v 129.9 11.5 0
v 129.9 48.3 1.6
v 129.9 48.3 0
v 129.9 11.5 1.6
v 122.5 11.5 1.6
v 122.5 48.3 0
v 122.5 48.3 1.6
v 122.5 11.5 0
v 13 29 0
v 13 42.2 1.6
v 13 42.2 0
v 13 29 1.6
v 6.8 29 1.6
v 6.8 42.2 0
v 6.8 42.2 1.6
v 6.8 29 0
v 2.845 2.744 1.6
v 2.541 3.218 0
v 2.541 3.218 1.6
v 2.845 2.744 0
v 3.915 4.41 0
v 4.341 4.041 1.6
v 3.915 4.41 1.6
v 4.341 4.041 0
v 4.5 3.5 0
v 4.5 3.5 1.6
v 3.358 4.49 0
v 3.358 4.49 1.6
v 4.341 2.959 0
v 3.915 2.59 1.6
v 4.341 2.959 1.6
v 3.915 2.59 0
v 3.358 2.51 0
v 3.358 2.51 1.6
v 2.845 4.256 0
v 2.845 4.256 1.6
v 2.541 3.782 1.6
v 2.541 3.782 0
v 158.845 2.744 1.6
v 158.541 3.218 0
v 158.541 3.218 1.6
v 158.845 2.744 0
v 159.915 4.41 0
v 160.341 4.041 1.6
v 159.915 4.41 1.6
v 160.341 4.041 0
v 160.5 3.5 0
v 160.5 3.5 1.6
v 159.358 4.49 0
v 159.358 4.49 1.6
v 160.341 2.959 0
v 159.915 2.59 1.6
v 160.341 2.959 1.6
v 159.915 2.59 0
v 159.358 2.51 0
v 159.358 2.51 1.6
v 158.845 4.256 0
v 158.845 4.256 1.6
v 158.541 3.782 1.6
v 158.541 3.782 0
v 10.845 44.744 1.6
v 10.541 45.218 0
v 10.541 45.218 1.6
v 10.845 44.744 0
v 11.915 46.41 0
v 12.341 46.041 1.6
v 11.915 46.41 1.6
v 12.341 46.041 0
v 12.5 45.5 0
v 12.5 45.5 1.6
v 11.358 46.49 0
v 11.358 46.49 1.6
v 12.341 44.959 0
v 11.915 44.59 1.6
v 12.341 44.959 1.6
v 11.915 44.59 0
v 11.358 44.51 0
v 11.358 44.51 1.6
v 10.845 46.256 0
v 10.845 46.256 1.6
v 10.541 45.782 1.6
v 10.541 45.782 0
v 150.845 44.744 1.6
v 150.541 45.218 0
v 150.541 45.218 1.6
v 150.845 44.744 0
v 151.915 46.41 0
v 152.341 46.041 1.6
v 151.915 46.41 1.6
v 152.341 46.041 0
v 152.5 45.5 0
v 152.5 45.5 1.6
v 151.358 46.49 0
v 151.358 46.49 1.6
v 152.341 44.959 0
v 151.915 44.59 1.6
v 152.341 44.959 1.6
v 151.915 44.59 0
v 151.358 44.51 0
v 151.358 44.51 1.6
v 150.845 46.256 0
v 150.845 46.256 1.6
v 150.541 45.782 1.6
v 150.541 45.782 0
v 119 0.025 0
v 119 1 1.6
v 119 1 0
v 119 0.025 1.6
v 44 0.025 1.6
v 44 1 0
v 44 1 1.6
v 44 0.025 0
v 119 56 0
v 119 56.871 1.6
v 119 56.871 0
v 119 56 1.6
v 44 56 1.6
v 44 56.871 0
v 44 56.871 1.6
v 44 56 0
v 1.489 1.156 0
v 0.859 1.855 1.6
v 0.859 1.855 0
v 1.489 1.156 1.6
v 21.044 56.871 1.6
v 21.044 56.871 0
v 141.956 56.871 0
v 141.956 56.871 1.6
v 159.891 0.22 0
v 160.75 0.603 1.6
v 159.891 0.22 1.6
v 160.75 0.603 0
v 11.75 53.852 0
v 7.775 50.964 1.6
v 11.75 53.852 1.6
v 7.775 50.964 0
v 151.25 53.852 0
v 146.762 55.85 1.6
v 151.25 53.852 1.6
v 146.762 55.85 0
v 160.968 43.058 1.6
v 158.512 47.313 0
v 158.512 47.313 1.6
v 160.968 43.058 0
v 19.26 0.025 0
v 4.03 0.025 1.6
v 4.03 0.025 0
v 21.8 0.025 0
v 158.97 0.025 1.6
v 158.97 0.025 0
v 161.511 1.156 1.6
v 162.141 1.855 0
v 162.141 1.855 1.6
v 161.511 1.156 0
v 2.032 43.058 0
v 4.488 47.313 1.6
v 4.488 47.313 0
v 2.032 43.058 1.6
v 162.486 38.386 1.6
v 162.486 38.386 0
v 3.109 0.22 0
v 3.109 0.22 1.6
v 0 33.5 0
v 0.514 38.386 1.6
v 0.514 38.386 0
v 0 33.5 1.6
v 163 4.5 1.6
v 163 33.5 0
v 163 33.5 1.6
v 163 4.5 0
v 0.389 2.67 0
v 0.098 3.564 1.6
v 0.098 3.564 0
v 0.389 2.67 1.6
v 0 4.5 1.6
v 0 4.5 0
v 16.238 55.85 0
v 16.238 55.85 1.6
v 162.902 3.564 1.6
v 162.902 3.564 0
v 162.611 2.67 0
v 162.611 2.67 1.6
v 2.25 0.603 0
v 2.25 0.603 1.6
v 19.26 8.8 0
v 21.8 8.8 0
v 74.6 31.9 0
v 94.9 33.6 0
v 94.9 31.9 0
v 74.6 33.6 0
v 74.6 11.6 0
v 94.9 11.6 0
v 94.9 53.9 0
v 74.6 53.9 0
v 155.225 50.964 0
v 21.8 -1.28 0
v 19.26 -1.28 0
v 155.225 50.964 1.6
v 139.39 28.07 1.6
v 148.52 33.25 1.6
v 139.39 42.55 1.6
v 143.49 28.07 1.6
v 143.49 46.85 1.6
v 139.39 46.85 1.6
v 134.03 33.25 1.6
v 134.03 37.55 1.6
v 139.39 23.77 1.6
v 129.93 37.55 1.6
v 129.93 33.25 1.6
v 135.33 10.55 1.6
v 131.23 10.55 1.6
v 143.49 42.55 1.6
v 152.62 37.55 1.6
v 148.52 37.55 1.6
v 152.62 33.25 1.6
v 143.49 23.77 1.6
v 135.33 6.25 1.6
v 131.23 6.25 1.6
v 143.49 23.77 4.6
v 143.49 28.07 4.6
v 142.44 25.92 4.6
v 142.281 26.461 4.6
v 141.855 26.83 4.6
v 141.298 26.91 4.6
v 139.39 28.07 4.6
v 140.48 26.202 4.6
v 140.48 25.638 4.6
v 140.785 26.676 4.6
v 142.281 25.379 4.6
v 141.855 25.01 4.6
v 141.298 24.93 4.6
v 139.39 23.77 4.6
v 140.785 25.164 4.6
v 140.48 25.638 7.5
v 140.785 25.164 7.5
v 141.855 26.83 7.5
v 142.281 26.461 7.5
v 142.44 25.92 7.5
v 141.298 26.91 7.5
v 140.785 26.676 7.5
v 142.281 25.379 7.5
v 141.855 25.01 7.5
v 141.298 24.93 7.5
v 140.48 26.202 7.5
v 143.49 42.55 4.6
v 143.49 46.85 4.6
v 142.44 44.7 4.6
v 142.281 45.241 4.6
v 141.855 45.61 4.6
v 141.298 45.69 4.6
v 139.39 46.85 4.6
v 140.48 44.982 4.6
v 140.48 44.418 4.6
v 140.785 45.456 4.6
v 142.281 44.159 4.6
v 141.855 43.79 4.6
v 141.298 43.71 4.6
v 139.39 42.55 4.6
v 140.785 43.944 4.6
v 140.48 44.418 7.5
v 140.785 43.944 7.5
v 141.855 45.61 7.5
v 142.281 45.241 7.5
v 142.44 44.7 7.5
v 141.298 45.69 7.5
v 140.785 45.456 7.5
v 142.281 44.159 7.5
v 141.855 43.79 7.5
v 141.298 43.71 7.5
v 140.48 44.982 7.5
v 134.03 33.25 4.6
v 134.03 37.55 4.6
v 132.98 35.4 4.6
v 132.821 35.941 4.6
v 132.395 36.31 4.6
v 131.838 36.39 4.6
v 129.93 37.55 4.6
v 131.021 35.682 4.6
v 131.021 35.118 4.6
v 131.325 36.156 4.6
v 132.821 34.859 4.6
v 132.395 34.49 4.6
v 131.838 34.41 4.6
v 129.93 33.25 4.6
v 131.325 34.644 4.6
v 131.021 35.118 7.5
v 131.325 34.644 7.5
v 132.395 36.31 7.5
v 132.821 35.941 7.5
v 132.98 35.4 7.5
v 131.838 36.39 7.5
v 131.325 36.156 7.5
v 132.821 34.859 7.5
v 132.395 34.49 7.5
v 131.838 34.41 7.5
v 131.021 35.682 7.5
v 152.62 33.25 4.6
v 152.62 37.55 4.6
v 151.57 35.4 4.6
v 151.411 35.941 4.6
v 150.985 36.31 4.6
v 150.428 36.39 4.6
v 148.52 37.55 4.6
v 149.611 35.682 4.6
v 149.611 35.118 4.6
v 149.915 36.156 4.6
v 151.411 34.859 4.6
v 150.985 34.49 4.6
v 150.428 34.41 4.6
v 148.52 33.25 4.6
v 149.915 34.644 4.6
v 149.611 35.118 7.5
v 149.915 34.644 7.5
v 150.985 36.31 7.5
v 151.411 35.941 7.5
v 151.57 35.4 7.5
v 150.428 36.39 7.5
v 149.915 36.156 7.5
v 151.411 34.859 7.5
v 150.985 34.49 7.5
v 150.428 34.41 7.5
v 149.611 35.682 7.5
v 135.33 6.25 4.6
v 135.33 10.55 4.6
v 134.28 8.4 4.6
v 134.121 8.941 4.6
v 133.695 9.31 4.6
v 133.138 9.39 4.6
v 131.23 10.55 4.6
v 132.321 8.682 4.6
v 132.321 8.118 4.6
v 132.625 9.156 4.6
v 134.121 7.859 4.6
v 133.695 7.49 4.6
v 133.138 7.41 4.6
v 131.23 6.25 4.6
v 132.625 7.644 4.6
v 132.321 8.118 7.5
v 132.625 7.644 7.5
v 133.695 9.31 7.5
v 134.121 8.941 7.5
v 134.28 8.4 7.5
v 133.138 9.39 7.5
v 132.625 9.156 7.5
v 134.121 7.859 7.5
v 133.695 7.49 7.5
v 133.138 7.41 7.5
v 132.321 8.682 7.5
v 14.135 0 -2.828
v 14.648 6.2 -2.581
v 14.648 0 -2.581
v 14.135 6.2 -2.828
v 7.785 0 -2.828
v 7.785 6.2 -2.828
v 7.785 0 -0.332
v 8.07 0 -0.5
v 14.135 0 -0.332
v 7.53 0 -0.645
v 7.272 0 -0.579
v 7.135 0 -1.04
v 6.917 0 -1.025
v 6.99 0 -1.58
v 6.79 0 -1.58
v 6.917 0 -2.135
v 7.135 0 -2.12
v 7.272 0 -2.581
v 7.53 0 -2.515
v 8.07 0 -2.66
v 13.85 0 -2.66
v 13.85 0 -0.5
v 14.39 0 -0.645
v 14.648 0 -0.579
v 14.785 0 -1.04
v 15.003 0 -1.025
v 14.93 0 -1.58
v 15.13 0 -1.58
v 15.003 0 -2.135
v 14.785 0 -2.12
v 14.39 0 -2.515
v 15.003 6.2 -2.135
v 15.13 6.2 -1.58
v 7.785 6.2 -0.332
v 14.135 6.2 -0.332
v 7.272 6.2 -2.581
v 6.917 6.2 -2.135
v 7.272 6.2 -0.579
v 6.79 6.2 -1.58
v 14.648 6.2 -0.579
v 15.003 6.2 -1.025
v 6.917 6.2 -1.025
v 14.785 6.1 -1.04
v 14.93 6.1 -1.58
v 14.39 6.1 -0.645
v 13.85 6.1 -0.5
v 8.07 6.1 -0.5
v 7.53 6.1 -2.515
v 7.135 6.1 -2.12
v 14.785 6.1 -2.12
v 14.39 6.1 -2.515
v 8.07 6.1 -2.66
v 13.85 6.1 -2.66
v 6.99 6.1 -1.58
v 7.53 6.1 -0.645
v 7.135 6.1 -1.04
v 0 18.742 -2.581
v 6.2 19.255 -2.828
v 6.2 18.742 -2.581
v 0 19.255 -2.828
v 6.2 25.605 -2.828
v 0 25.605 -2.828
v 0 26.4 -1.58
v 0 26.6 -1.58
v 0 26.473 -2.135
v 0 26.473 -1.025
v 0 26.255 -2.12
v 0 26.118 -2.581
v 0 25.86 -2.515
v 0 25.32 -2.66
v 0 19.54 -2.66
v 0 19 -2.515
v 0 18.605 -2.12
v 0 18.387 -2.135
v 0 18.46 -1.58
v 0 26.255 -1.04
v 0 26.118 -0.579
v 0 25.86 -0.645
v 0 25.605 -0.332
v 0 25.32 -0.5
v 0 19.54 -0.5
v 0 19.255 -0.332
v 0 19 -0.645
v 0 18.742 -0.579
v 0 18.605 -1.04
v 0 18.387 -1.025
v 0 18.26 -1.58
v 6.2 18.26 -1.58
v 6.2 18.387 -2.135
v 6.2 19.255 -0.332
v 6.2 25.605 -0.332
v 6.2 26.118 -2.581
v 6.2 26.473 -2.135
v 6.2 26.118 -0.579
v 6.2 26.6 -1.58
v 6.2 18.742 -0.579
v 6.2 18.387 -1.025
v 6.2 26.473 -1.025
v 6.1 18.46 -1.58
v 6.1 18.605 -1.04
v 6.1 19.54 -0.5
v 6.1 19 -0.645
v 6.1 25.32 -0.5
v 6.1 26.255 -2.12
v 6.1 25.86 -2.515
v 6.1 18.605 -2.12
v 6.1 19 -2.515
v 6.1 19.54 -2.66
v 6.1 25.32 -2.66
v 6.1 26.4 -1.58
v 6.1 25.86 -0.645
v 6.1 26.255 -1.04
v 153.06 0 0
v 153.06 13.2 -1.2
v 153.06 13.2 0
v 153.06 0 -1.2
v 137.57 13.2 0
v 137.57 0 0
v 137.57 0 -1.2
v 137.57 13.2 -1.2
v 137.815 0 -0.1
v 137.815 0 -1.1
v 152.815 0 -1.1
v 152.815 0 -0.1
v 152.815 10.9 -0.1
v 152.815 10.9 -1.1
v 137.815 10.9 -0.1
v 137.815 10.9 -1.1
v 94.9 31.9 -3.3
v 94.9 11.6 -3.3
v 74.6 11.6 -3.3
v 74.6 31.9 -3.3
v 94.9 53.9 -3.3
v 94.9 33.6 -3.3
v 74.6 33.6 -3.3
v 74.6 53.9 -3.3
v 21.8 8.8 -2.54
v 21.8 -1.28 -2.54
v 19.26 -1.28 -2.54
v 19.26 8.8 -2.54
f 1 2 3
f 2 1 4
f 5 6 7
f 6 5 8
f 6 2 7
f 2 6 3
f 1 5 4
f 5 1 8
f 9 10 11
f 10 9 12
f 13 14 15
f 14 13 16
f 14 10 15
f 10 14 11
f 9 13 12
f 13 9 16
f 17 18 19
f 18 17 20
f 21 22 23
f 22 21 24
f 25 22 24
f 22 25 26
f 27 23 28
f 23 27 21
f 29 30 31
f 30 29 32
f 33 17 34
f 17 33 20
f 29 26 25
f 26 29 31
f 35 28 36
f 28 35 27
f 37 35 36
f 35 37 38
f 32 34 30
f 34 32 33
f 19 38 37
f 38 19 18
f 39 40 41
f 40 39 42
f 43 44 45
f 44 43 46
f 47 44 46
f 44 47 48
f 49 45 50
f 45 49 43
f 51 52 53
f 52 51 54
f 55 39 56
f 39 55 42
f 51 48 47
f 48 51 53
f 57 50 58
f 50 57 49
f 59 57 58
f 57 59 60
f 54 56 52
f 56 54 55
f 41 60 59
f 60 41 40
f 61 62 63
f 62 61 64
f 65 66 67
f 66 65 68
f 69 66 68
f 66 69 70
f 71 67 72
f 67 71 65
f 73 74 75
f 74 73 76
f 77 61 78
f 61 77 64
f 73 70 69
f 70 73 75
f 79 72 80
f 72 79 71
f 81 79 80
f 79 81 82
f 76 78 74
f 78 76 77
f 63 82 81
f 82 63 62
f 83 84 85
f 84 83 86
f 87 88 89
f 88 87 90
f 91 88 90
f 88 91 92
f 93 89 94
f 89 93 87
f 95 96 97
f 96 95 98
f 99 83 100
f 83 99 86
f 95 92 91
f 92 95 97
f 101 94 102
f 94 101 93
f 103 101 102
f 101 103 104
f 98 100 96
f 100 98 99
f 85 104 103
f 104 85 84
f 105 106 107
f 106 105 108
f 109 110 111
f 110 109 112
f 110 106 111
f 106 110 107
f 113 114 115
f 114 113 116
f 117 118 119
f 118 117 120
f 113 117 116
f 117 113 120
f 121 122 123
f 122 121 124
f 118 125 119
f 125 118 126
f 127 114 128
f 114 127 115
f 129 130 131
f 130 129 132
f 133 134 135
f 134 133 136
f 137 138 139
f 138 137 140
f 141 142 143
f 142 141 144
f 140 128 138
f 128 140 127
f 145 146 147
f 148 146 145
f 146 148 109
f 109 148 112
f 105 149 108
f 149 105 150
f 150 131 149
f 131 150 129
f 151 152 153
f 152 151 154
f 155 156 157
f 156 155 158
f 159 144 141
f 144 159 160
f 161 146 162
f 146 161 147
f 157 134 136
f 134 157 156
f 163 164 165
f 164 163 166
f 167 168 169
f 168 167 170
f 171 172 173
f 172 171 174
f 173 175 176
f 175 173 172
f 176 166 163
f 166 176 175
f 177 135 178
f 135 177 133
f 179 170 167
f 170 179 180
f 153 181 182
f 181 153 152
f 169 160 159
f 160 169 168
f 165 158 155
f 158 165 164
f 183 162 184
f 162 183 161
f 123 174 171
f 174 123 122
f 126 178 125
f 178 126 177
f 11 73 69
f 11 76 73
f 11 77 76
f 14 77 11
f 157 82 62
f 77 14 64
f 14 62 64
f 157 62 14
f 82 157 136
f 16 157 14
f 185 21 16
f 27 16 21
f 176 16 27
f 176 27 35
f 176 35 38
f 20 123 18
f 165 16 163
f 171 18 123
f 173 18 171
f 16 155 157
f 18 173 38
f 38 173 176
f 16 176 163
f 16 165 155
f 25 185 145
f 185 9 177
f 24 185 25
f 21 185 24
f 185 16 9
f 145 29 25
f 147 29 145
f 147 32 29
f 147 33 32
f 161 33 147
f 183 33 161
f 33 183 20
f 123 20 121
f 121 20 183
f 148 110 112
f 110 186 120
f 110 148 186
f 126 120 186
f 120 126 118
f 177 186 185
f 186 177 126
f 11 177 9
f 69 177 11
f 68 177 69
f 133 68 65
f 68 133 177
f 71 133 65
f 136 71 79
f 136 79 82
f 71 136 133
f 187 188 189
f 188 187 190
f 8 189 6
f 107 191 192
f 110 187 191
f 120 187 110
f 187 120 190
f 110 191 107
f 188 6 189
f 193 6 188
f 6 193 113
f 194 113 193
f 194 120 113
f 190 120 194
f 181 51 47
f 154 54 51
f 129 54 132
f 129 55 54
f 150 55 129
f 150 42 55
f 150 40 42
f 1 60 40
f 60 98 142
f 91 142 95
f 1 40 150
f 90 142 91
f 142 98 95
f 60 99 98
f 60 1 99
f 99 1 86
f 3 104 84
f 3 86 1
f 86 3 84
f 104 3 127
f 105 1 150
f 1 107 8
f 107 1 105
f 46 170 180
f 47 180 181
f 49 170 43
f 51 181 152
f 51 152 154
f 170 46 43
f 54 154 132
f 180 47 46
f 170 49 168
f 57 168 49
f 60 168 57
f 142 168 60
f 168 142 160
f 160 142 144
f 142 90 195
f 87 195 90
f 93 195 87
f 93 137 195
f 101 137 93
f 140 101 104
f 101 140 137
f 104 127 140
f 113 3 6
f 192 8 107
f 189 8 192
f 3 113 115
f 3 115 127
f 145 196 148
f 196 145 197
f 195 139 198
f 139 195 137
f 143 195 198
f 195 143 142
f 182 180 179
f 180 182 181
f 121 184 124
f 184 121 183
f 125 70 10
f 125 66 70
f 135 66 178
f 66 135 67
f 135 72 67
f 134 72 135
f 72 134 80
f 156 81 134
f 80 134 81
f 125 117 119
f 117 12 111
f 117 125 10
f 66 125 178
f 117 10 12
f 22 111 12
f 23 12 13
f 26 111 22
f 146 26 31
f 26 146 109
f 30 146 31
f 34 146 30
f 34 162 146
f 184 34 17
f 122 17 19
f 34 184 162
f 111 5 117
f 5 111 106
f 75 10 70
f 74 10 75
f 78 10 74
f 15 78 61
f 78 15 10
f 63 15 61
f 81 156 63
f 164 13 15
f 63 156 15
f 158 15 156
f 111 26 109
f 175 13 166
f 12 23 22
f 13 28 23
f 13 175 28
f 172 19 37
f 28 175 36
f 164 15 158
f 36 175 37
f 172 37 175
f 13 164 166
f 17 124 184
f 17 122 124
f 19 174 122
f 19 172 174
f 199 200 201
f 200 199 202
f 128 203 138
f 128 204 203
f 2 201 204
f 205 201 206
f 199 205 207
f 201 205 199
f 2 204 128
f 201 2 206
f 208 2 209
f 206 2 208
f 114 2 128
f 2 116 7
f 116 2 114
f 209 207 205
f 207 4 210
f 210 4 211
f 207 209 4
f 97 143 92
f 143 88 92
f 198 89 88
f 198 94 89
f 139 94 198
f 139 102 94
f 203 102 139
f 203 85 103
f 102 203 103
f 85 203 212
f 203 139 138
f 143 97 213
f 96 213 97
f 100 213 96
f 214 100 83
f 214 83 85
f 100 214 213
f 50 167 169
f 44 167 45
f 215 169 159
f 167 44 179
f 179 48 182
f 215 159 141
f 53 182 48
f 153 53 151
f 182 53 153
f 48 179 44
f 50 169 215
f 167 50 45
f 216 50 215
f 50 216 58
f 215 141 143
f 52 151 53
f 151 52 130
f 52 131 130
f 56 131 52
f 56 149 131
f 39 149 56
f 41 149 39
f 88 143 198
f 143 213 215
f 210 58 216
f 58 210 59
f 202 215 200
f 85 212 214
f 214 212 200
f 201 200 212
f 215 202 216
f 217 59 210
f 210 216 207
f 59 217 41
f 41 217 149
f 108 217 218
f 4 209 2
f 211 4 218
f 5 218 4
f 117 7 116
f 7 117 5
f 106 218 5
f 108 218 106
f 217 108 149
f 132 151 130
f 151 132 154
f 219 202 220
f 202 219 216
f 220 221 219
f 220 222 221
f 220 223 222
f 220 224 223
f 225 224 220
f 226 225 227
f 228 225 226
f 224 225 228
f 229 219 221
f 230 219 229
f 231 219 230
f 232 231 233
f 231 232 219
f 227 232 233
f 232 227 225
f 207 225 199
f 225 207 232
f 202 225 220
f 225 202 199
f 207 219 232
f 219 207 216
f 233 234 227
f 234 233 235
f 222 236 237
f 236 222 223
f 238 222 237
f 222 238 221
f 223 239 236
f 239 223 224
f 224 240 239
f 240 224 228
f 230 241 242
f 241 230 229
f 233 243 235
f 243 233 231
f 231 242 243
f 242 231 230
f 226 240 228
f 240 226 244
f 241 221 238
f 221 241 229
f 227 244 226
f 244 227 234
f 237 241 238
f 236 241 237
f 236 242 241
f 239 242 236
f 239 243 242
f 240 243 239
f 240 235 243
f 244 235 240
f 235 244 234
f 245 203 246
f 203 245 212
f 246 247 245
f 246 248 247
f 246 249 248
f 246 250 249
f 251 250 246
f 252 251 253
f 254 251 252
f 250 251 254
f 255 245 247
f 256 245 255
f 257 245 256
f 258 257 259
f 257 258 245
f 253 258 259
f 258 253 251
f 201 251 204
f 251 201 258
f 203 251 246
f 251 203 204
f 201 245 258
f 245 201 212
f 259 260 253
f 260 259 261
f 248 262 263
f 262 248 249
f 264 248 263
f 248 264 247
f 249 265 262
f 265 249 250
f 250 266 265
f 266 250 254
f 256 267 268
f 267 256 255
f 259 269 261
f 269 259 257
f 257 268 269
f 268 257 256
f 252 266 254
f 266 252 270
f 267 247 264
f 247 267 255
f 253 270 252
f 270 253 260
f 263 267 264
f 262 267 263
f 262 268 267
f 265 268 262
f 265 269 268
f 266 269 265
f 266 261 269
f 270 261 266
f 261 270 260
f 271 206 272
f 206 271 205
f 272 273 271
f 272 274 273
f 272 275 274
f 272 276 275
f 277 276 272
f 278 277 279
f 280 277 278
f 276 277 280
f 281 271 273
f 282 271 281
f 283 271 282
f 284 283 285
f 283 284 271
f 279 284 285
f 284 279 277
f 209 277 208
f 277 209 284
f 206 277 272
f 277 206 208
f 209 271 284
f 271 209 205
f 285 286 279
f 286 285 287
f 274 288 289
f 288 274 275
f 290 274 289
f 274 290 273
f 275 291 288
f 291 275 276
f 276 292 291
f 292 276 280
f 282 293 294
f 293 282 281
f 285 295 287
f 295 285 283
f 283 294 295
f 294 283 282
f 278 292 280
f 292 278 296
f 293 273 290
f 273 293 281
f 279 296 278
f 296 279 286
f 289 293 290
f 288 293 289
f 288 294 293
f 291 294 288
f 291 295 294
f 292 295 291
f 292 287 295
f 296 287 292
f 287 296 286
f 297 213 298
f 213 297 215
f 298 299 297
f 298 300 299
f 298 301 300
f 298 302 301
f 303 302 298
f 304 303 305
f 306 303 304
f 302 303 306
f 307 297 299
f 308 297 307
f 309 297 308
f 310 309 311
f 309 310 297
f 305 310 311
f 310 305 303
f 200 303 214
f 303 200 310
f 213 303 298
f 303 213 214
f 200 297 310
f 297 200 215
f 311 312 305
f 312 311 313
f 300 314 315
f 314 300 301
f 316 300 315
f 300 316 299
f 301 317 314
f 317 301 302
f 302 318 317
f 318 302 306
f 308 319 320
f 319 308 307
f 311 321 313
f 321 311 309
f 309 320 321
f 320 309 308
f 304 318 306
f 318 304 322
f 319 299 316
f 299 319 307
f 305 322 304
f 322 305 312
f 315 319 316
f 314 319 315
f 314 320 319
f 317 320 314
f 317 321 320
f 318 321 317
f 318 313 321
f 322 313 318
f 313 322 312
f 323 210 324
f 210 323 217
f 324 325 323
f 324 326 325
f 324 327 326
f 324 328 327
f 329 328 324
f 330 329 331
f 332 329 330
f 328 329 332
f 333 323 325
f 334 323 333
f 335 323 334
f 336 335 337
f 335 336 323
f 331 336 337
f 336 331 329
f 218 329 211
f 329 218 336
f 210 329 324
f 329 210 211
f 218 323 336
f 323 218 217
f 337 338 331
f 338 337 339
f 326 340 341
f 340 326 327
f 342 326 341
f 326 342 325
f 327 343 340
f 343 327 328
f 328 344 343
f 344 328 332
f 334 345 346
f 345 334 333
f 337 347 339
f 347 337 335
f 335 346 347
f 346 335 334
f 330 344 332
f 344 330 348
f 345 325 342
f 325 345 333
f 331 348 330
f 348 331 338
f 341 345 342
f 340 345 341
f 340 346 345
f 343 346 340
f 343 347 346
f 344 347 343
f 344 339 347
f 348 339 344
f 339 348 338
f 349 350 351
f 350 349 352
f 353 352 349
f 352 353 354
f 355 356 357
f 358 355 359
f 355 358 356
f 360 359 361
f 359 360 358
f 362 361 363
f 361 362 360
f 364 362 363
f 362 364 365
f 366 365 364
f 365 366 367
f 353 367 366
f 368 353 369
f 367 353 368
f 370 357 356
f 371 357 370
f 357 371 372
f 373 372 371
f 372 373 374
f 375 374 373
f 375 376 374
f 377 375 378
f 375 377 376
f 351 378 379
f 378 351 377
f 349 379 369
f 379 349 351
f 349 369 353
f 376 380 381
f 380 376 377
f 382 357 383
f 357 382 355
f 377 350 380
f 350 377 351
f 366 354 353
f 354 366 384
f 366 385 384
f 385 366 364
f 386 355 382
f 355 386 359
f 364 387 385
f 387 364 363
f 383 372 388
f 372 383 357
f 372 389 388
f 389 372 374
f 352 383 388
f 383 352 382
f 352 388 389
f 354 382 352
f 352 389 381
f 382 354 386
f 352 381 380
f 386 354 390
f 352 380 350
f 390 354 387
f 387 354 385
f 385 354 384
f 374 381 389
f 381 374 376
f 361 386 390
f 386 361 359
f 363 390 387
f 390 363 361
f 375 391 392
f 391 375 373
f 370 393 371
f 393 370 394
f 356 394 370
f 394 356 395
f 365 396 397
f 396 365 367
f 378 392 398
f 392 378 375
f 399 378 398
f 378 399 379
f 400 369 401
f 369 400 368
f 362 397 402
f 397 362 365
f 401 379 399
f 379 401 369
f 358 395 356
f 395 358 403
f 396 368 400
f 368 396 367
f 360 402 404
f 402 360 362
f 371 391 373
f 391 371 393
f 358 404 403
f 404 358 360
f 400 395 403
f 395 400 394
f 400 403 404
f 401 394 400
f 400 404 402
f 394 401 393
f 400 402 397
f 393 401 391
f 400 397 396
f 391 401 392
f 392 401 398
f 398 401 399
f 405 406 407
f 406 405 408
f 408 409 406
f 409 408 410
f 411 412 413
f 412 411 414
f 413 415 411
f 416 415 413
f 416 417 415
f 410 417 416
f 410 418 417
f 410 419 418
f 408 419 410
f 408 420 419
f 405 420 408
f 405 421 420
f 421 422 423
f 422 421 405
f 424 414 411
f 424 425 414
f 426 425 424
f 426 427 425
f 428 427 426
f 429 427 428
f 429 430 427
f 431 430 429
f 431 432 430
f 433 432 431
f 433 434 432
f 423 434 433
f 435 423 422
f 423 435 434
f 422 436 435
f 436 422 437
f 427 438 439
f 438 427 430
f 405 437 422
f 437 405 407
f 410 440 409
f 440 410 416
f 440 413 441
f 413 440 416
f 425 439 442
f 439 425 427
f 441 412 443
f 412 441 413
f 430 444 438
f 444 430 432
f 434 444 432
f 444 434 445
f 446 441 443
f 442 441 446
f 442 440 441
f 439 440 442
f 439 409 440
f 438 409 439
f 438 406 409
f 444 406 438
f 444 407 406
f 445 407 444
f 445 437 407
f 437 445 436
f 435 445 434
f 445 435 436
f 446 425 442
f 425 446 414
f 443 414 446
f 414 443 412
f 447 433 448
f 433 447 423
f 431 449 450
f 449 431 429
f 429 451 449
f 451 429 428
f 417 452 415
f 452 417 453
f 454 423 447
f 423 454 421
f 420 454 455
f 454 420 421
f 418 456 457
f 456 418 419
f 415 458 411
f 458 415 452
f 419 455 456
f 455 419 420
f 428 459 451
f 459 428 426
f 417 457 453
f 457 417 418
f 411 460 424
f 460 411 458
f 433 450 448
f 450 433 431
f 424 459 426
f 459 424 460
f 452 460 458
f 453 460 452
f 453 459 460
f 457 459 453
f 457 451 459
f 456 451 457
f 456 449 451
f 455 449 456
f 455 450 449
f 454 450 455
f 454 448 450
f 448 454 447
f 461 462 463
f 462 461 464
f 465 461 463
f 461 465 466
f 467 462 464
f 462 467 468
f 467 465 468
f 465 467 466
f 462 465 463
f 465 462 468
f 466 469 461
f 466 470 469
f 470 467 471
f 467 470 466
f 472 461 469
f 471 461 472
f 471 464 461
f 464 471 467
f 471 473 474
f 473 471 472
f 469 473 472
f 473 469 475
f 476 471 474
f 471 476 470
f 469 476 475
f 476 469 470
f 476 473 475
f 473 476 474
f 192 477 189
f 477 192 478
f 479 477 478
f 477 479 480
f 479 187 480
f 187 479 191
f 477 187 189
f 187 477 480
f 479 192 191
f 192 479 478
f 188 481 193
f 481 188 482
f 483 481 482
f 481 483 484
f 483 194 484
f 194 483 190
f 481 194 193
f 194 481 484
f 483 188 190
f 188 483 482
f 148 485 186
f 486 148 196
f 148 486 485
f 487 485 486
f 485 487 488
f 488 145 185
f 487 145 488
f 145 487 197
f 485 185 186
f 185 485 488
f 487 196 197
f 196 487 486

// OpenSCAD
$fs = 0.6;

W = 163;
H = 57;
T = 1.6;
RB = 4.5; // Radius of the bottom corners.
RT = 23.5; // Radius of the top corners.
WESP = 20.30; // Width of ESP chip.
TESP = 3.3; // Thickness of ESP chip.

WBTN = 4.1;
HBTN = 4.3;
TBTN = 3;

MBHOLE = 4.5 - 1; // Margin of the bottom screw holes.
MTHOLE = 12.5 - 1; // Margin of the bottom screw holes.

WSCR = 73; // Width of the display's visible part.
HSCR = 49; // Height of the display's visible part.

module pcb() {
  color("green")
    difference() {
      hull() {
        // top-left corner
        translate([RT, H - RT, 0])
          cylinder(h=T, r=RT);
        // top-right corner
        translate([W - RT, H - RT, 0])
          cylinder(h=T, r=RT);
        // bottom-left corner
        translate([RB, RB, 0])
          cylinder(h=T, r=RB);
        // bottom-right corner
        translate([W - RB, RB, 0])
          cylinder(h=T, r=RB);
      }
      pcb_holes();
    }
  pcb_components();
}

module pcb_holes() {
  // screen cutout
  translate([122.5, 11.5, -.1])
    cube([7.4, 36.8, 3]);
  // pad cutout
  translate([6.8, 29, -.1])
    cube([6.2, 13.2, 3]);
  translate([MBHOLE, MBHOLE, -.1])
    cylinder(h=4, r=1);
  translate([W - MBHOLE, MBHOLE, -.1])
    cylinder(h=4, r=1);
  translate([MTHOLE, H - MTHOLE, -.1])
    cylinder(h=4, r=1);
  translate([W - MTHOLE, H - MTHOLE, -.1])
    cylinder(h=4, r=1);
  translate([(W - WSCR) / 2 - 1, 0, -.1])
    cube([WSCR + 2, 1, 4]);
  translate([(W - WSCR) / 2 - 1, H - 1, -.1])
    cube([WSCR + 2, 1, 4]);
}

module pcb_components() {
  // ESP 1
  translate([74.6, 11.6, -TESP])
    cube([WESP, WESP, TESP + .1]);
  // ESP 2
  translate([74.6, 33.6, -TESP])
    cube([WESP, WESP, TESP + .1]);
  // button S
  translate([139.39, 23.77, T - .1])
    pcb_button();
  // button N
  translate([139.39, 42.55, T - .1])
    pcb_button();
  // button W
  translate([129.93, 33.25, T - .1])
    pcb_button();
  // button E
  translate([148.52, 33.25, T - .1])
    pcb_button();
  // button menu
  translate([131.23, 6.25, T - .1])
    pcb_button();
  // usb port
  translate([6.79, 0, -.3])
    pcb_usb_port();
  // extra usb port
  translate([0, 26.6, -.3])
    rotate(270)
      pcb_usb_port();
  // SD card reader
  translate([137.57, 0, 0])
    pcb_sd_card();
  // reset button
  color("blue")
    translate([19.26, -1.28, -2.54])
      cube([2.54, 10.08, 2.54]);
}

module pcb_usb_port() {
  TUSB = 2.56;
  color("white")
    translate([TUSB / 2, 6.20, -TUSB / 2])
      rotate(90, [1, 0, 0])
        difference() {
          hull() {
            cylinder(h=6.20, r=TUSB / 2);
            translate([8.34 - TUSB, 0, 0])
              cylinder(h=6.20, r=TUSB / 2);
          }
          translate([0, 0, .1])
            hull() {
              cylinder(h=6.20, r=TUSB / 2 - .2);
              translate([8.34 - TUSB, 0, 0])
                cylinder(h=6.20, r=TUSB / 2 - .2);
            }
        }
}

module pcb_sd_card() {
  color("white")
    translate([0, 0, -1.20])
      difference() {
        cube([15.49, 13.20, 1.20]);
        translate([.49 / 2, -.1, .2 / 2])
          cube([15, 11, 1]);
      }
}

module pcb_button() {
  color("gray")
    cube([WBTN, HBTN, TBTN + .1]);
  color("blue")
    translate([WBTN / 2, HBTN / 2, 0])
      cylinder(h=6, r=1);
  ;
}

pcb();

// translate([-68.61 - 2, 127.4 - 2, 0])
//   color("purple")
//     import("./pcb.stl");
